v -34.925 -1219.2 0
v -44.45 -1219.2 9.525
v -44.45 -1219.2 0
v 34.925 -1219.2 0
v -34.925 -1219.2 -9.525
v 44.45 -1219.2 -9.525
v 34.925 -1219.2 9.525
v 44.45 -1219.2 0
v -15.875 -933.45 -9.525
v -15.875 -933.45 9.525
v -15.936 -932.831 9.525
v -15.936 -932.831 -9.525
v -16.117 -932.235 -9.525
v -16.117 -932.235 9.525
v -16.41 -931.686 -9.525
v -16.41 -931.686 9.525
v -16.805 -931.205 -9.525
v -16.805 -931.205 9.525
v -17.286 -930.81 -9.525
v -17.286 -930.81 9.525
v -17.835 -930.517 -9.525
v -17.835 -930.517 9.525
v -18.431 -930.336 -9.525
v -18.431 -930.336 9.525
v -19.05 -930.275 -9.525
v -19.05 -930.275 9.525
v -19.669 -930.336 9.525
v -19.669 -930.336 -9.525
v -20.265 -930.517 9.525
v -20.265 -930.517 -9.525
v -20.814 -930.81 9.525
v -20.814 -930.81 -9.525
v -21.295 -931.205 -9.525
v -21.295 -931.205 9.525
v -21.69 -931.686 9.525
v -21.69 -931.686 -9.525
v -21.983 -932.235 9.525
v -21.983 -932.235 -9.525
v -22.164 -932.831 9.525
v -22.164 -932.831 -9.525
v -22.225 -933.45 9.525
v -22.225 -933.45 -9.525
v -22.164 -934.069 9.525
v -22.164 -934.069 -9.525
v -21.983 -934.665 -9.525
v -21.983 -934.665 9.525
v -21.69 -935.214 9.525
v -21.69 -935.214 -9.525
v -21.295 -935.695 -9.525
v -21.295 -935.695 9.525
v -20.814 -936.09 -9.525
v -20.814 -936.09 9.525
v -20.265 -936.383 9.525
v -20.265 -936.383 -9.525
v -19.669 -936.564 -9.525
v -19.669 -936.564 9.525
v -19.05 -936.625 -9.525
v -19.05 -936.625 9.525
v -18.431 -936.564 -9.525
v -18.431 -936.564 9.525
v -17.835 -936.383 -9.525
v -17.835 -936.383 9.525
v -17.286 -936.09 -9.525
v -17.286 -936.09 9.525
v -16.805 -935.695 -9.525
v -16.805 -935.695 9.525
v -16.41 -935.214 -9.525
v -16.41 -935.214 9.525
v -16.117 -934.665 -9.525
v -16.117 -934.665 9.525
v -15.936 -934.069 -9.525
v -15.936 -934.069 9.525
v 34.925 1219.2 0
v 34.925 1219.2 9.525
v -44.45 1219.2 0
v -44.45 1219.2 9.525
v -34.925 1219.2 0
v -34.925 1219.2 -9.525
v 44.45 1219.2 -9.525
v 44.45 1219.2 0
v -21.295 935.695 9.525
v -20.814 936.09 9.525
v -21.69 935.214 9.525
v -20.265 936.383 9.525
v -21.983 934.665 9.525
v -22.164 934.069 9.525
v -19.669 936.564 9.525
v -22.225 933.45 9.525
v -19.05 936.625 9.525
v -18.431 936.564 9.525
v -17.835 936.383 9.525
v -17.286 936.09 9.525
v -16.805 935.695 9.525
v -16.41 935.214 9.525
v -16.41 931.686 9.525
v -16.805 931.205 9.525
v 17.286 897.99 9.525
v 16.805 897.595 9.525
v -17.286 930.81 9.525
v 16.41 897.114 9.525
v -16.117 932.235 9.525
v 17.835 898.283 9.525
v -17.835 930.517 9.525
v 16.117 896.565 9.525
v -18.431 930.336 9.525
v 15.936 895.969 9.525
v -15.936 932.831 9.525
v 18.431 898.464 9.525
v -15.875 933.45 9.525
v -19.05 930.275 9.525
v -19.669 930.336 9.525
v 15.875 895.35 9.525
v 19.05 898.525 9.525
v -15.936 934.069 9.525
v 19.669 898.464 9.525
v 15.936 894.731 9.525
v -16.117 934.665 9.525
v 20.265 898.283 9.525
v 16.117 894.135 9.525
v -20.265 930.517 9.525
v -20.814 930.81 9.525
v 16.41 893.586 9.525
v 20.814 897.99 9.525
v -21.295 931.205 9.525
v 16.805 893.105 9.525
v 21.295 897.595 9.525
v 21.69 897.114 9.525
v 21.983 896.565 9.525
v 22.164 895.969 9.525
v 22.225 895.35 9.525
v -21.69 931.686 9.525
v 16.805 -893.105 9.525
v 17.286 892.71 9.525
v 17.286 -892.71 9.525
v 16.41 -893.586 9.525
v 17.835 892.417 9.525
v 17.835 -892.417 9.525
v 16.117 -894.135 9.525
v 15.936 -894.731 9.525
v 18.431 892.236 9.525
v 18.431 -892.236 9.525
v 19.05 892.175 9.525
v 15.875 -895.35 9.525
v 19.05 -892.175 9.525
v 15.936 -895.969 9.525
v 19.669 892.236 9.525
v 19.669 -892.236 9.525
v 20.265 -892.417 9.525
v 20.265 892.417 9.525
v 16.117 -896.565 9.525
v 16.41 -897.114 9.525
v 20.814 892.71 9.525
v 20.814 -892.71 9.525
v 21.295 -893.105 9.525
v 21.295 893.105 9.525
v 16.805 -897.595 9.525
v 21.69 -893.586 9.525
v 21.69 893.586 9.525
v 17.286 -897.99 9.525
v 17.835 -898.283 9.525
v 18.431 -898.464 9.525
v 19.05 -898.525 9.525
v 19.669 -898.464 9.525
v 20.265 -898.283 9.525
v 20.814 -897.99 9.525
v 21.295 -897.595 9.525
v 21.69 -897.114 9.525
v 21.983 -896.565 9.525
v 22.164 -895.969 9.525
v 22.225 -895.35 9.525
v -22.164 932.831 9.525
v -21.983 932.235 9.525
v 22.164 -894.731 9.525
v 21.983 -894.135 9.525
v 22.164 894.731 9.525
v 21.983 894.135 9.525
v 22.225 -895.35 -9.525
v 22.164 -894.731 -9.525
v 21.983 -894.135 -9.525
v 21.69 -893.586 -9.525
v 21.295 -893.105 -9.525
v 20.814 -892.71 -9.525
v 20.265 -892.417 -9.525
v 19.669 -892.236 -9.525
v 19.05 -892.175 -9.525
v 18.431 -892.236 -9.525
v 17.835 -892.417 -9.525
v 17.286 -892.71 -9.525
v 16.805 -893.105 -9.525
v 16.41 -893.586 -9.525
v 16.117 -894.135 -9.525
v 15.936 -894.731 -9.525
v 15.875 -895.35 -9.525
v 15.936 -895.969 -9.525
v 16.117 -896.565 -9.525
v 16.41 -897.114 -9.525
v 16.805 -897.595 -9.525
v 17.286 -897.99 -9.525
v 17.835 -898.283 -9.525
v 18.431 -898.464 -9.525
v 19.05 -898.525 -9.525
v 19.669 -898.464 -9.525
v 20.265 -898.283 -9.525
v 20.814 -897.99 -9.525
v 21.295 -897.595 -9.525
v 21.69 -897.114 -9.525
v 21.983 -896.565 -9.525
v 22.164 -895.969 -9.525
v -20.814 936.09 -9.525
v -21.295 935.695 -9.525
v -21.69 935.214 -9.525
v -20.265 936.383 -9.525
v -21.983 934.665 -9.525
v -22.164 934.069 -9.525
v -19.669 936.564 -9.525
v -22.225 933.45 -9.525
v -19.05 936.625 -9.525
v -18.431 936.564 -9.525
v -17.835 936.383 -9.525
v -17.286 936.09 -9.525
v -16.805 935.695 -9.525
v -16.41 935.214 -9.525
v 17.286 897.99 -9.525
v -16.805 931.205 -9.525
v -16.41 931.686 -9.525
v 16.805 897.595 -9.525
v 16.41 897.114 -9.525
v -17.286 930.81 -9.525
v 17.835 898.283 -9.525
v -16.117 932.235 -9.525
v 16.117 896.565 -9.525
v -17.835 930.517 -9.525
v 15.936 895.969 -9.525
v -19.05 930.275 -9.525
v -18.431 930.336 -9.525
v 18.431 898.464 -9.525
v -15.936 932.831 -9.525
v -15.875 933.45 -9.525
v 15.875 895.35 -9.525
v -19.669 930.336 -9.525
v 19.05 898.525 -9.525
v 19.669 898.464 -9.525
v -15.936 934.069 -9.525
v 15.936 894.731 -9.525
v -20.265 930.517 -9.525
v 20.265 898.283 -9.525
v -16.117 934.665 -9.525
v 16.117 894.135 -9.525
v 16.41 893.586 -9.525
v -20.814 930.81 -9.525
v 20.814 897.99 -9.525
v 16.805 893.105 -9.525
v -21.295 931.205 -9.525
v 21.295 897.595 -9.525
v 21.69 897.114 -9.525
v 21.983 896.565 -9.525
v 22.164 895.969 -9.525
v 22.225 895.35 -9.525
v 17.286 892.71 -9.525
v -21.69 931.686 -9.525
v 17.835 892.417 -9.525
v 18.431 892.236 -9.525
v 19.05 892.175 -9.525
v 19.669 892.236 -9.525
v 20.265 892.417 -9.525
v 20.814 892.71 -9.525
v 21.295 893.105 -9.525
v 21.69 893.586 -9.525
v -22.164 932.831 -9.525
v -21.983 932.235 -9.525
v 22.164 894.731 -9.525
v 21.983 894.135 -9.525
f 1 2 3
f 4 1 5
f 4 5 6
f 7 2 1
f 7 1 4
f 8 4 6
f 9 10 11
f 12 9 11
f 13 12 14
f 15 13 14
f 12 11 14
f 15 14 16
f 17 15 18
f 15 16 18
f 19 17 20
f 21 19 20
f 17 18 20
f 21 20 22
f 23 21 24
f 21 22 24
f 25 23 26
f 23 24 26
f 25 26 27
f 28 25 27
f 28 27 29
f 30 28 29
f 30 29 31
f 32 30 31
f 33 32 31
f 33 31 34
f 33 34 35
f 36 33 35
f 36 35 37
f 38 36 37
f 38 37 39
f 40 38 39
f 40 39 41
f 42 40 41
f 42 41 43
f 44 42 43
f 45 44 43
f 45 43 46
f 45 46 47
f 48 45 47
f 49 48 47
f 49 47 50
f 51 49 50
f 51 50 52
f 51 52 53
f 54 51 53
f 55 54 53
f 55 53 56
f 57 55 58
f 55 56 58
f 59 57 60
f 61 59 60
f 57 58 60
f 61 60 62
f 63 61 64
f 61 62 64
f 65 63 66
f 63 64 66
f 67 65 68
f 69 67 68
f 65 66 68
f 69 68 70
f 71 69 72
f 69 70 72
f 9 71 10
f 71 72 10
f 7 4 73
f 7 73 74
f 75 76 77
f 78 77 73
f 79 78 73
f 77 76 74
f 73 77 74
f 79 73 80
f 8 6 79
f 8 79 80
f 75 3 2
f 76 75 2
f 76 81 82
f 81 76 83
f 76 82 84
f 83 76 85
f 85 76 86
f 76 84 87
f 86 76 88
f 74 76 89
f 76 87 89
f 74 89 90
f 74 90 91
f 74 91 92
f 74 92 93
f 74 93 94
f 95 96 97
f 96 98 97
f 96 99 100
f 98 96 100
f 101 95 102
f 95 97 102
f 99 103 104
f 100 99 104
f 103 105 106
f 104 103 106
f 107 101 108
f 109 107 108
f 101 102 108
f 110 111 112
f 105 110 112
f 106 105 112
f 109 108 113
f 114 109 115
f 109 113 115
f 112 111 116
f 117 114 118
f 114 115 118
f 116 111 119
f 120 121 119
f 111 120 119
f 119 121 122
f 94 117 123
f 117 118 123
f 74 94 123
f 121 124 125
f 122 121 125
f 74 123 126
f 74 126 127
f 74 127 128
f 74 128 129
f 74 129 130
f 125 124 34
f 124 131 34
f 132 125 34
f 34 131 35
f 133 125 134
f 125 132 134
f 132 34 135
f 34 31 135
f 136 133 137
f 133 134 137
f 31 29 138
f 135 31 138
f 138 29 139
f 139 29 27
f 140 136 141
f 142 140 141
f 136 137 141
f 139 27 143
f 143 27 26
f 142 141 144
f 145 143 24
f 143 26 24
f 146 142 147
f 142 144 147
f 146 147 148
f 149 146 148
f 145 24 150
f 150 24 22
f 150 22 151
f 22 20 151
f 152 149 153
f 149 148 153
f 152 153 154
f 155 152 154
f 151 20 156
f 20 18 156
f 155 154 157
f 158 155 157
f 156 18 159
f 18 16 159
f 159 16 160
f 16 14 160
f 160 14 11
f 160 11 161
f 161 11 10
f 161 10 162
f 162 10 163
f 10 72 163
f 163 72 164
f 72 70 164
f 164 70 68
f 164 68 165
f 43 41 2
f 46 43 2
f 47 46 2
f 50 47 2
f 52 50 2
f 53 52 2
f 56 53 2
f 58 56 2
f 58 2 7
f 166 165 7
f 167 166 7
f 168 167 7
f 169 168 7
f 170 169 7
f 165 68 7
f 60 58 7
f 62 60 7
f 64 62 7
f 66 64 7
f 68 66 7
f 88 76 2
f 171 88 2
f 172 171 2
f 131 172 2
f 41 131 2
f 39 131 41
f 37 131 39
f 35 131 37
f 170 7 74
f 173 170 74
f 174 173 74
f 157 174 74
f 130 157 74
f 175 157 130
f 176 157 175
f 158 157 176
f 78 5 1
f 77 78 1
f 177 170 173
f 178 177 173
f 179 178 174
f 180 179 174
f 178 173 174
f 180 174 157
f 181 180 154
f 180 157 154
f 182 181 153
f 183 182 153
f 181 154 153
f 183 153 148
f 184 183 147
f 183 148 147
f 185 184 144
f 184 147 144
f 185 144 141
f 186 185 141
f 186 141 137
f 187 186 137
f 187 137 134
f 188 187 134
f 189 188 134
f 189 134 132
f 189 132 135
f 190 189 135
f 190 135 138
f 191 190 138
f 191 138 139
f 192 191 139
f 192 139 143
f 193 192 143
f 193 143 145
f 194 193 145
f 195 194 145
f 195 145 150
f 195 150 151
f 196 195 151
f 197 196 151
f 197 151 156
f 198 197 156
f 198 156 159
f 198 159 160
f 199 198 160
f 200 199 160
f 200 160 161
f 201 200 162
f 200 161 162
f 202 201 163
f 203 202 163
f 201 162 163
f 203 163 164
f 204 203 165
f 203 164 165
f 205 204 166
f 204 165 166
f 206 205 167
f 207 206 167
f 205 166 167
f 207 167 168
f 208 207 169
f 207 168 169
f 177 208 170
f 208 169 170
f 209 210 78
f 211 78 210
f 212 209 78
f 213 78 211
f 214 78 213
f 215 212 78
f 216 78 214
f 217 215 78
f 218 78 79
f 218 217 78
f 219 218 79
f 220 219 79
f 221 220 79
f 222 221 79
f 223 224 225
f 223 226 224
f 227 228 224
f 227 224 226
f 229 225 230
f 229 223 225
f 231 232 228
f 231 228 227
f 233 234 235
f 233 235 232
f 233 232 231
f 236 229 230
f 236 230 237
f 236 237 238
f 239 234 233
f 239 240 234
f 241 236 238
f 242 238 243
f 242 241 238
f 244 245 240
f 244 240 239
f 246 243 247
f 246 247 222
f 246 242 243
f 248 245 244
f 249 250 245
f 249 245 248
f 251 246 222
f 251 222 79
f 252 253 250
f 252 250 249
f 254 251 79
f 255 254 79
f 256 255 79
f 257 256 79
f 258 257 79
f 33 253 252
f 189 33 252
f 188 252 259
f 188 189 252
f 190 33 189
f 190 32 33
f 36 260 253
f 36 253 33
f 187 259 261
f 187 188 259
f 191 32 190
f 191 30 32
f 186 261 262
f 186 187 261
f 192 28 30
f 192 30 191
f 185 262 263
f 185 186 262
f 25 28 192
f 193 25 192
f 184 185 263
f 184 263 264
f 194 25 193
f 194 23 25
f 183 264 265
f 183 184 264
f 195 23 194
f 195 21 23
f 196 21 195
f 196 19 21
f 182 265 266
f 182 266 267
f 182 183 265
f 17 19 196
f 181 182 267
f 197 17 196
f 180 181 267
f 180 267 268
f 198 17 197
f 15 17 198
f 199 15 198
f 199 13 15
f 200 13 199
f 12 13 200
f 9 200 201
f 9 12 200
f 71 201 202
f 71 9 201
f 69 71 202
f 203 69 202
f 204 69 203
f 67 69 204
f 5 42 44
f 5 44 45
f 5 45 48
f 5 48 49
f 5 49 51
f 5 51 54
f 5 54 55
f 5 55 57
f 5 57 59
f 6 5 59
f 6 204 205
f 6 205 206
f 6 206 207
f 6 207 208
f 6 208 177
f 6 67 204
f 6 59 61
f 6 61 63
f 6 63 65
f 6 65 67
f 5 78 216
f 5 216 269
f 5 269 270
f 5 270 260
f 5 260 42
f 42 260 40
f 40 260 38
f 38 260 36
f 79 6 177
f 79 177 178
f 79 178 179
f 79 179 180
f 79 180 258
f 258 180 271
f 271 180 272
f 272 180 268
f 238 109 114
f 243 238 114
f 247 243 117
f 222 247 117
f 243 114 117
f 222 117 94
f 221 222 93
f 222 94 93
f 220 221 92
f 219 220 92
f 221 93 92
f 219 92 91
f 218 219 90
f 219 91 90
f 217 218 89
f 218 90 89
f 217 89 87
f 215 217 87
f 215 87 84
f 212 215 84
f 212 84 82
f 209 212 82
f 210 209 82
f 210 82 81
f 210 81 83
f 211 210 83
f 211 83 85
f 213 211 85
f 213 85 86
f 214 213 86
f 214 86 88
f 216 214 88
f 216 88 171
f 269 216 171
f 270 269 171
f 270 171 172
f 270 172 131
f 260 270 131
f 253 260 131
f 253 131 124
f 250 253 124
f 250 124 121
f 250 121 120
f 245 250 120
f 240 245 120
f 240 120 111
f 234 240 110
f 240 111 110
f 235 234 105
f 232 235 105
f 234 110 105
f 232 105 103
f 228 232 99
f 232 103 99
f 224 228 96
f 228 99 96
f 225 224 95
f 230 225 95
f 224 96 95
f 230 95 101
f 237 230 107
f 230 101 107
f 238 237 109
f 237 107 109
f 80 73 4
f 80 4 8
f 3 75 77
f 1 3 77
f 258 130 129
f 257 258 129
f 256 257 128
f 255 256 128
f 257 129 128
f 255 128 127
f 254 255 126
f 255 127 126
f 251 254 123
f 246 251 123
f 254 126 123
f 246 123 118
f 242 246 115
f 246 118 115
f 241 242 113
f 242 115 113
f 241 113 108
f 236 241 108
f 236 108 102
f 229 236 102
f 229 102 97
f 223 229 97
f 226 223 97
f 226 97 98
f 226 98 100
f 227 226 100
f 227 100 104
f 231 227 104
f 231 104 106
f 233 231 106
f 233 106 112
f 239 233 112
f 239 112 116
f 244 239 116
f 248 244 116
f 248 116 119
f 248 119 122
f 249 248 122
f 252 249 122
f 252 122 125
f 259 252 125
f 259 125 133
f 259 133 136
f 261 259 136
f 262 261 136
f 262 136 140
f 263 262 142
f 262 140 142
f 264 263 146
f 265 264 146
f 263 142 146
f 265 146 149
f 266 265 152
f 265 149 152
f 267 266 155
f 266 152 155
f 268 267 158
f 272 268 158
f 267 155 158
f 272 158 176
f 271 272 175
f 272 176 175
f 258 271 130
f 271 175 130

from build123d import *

# Parameters (mm, degrees)
F0_W     = 88.9
F0_H     = 19.05
F1_DEPTH = 1219.2
F2_W     = 47.0931410961
F2_H     = 23.1275351422
F2_W_2   = 44.1598849037
F2_H_2   = 21.9993637201
F3_DEPTH = 2438.401
F4_R     = 3.175
F5_DEPTH = 19.051


with BuildPart() as f1:
    # F0 (on Front) → F1 (new body, symmetric)
    with BuildSketch(Plane.XZ):
        Rectangle(F0_W, F0_H)
    extrude(amount=F1_DEPTH, both=True)

    # F2 (on face) → F3 (cut, through all)
    with BuildSketch(Plane.XZ.offset(1219.2)):
        with Locations((-58.471570548, -11.5637675711)):
            Rectangle(F2_W, F2_H)
        with Locations((57.0049424518, 10.9996818601)):
            Rectangle(F2_W_2, F2_H_2)
    extrude(amount=-F3_DEPTH, mode=Mode.SUBTRACT)

    # F4 (on face) → F5 (cut, through all)
    with BuildSketch(Plane.XY.offset(9.525)):
        with Locations((-19.05, -933.45)):
            Circle(F4_R)
        with Locations((19.05, -895.35)):
            Circle(F4_R)
        with Locations((-19.05, 933.45)):
            Circle(F4_R)
        with Locations((19.05, 895.35)):
            Circle(F4_R)
    extrude(amount=-F5_DEPTH, mode=Mode.SUBTRACT)


solid = f1.part
